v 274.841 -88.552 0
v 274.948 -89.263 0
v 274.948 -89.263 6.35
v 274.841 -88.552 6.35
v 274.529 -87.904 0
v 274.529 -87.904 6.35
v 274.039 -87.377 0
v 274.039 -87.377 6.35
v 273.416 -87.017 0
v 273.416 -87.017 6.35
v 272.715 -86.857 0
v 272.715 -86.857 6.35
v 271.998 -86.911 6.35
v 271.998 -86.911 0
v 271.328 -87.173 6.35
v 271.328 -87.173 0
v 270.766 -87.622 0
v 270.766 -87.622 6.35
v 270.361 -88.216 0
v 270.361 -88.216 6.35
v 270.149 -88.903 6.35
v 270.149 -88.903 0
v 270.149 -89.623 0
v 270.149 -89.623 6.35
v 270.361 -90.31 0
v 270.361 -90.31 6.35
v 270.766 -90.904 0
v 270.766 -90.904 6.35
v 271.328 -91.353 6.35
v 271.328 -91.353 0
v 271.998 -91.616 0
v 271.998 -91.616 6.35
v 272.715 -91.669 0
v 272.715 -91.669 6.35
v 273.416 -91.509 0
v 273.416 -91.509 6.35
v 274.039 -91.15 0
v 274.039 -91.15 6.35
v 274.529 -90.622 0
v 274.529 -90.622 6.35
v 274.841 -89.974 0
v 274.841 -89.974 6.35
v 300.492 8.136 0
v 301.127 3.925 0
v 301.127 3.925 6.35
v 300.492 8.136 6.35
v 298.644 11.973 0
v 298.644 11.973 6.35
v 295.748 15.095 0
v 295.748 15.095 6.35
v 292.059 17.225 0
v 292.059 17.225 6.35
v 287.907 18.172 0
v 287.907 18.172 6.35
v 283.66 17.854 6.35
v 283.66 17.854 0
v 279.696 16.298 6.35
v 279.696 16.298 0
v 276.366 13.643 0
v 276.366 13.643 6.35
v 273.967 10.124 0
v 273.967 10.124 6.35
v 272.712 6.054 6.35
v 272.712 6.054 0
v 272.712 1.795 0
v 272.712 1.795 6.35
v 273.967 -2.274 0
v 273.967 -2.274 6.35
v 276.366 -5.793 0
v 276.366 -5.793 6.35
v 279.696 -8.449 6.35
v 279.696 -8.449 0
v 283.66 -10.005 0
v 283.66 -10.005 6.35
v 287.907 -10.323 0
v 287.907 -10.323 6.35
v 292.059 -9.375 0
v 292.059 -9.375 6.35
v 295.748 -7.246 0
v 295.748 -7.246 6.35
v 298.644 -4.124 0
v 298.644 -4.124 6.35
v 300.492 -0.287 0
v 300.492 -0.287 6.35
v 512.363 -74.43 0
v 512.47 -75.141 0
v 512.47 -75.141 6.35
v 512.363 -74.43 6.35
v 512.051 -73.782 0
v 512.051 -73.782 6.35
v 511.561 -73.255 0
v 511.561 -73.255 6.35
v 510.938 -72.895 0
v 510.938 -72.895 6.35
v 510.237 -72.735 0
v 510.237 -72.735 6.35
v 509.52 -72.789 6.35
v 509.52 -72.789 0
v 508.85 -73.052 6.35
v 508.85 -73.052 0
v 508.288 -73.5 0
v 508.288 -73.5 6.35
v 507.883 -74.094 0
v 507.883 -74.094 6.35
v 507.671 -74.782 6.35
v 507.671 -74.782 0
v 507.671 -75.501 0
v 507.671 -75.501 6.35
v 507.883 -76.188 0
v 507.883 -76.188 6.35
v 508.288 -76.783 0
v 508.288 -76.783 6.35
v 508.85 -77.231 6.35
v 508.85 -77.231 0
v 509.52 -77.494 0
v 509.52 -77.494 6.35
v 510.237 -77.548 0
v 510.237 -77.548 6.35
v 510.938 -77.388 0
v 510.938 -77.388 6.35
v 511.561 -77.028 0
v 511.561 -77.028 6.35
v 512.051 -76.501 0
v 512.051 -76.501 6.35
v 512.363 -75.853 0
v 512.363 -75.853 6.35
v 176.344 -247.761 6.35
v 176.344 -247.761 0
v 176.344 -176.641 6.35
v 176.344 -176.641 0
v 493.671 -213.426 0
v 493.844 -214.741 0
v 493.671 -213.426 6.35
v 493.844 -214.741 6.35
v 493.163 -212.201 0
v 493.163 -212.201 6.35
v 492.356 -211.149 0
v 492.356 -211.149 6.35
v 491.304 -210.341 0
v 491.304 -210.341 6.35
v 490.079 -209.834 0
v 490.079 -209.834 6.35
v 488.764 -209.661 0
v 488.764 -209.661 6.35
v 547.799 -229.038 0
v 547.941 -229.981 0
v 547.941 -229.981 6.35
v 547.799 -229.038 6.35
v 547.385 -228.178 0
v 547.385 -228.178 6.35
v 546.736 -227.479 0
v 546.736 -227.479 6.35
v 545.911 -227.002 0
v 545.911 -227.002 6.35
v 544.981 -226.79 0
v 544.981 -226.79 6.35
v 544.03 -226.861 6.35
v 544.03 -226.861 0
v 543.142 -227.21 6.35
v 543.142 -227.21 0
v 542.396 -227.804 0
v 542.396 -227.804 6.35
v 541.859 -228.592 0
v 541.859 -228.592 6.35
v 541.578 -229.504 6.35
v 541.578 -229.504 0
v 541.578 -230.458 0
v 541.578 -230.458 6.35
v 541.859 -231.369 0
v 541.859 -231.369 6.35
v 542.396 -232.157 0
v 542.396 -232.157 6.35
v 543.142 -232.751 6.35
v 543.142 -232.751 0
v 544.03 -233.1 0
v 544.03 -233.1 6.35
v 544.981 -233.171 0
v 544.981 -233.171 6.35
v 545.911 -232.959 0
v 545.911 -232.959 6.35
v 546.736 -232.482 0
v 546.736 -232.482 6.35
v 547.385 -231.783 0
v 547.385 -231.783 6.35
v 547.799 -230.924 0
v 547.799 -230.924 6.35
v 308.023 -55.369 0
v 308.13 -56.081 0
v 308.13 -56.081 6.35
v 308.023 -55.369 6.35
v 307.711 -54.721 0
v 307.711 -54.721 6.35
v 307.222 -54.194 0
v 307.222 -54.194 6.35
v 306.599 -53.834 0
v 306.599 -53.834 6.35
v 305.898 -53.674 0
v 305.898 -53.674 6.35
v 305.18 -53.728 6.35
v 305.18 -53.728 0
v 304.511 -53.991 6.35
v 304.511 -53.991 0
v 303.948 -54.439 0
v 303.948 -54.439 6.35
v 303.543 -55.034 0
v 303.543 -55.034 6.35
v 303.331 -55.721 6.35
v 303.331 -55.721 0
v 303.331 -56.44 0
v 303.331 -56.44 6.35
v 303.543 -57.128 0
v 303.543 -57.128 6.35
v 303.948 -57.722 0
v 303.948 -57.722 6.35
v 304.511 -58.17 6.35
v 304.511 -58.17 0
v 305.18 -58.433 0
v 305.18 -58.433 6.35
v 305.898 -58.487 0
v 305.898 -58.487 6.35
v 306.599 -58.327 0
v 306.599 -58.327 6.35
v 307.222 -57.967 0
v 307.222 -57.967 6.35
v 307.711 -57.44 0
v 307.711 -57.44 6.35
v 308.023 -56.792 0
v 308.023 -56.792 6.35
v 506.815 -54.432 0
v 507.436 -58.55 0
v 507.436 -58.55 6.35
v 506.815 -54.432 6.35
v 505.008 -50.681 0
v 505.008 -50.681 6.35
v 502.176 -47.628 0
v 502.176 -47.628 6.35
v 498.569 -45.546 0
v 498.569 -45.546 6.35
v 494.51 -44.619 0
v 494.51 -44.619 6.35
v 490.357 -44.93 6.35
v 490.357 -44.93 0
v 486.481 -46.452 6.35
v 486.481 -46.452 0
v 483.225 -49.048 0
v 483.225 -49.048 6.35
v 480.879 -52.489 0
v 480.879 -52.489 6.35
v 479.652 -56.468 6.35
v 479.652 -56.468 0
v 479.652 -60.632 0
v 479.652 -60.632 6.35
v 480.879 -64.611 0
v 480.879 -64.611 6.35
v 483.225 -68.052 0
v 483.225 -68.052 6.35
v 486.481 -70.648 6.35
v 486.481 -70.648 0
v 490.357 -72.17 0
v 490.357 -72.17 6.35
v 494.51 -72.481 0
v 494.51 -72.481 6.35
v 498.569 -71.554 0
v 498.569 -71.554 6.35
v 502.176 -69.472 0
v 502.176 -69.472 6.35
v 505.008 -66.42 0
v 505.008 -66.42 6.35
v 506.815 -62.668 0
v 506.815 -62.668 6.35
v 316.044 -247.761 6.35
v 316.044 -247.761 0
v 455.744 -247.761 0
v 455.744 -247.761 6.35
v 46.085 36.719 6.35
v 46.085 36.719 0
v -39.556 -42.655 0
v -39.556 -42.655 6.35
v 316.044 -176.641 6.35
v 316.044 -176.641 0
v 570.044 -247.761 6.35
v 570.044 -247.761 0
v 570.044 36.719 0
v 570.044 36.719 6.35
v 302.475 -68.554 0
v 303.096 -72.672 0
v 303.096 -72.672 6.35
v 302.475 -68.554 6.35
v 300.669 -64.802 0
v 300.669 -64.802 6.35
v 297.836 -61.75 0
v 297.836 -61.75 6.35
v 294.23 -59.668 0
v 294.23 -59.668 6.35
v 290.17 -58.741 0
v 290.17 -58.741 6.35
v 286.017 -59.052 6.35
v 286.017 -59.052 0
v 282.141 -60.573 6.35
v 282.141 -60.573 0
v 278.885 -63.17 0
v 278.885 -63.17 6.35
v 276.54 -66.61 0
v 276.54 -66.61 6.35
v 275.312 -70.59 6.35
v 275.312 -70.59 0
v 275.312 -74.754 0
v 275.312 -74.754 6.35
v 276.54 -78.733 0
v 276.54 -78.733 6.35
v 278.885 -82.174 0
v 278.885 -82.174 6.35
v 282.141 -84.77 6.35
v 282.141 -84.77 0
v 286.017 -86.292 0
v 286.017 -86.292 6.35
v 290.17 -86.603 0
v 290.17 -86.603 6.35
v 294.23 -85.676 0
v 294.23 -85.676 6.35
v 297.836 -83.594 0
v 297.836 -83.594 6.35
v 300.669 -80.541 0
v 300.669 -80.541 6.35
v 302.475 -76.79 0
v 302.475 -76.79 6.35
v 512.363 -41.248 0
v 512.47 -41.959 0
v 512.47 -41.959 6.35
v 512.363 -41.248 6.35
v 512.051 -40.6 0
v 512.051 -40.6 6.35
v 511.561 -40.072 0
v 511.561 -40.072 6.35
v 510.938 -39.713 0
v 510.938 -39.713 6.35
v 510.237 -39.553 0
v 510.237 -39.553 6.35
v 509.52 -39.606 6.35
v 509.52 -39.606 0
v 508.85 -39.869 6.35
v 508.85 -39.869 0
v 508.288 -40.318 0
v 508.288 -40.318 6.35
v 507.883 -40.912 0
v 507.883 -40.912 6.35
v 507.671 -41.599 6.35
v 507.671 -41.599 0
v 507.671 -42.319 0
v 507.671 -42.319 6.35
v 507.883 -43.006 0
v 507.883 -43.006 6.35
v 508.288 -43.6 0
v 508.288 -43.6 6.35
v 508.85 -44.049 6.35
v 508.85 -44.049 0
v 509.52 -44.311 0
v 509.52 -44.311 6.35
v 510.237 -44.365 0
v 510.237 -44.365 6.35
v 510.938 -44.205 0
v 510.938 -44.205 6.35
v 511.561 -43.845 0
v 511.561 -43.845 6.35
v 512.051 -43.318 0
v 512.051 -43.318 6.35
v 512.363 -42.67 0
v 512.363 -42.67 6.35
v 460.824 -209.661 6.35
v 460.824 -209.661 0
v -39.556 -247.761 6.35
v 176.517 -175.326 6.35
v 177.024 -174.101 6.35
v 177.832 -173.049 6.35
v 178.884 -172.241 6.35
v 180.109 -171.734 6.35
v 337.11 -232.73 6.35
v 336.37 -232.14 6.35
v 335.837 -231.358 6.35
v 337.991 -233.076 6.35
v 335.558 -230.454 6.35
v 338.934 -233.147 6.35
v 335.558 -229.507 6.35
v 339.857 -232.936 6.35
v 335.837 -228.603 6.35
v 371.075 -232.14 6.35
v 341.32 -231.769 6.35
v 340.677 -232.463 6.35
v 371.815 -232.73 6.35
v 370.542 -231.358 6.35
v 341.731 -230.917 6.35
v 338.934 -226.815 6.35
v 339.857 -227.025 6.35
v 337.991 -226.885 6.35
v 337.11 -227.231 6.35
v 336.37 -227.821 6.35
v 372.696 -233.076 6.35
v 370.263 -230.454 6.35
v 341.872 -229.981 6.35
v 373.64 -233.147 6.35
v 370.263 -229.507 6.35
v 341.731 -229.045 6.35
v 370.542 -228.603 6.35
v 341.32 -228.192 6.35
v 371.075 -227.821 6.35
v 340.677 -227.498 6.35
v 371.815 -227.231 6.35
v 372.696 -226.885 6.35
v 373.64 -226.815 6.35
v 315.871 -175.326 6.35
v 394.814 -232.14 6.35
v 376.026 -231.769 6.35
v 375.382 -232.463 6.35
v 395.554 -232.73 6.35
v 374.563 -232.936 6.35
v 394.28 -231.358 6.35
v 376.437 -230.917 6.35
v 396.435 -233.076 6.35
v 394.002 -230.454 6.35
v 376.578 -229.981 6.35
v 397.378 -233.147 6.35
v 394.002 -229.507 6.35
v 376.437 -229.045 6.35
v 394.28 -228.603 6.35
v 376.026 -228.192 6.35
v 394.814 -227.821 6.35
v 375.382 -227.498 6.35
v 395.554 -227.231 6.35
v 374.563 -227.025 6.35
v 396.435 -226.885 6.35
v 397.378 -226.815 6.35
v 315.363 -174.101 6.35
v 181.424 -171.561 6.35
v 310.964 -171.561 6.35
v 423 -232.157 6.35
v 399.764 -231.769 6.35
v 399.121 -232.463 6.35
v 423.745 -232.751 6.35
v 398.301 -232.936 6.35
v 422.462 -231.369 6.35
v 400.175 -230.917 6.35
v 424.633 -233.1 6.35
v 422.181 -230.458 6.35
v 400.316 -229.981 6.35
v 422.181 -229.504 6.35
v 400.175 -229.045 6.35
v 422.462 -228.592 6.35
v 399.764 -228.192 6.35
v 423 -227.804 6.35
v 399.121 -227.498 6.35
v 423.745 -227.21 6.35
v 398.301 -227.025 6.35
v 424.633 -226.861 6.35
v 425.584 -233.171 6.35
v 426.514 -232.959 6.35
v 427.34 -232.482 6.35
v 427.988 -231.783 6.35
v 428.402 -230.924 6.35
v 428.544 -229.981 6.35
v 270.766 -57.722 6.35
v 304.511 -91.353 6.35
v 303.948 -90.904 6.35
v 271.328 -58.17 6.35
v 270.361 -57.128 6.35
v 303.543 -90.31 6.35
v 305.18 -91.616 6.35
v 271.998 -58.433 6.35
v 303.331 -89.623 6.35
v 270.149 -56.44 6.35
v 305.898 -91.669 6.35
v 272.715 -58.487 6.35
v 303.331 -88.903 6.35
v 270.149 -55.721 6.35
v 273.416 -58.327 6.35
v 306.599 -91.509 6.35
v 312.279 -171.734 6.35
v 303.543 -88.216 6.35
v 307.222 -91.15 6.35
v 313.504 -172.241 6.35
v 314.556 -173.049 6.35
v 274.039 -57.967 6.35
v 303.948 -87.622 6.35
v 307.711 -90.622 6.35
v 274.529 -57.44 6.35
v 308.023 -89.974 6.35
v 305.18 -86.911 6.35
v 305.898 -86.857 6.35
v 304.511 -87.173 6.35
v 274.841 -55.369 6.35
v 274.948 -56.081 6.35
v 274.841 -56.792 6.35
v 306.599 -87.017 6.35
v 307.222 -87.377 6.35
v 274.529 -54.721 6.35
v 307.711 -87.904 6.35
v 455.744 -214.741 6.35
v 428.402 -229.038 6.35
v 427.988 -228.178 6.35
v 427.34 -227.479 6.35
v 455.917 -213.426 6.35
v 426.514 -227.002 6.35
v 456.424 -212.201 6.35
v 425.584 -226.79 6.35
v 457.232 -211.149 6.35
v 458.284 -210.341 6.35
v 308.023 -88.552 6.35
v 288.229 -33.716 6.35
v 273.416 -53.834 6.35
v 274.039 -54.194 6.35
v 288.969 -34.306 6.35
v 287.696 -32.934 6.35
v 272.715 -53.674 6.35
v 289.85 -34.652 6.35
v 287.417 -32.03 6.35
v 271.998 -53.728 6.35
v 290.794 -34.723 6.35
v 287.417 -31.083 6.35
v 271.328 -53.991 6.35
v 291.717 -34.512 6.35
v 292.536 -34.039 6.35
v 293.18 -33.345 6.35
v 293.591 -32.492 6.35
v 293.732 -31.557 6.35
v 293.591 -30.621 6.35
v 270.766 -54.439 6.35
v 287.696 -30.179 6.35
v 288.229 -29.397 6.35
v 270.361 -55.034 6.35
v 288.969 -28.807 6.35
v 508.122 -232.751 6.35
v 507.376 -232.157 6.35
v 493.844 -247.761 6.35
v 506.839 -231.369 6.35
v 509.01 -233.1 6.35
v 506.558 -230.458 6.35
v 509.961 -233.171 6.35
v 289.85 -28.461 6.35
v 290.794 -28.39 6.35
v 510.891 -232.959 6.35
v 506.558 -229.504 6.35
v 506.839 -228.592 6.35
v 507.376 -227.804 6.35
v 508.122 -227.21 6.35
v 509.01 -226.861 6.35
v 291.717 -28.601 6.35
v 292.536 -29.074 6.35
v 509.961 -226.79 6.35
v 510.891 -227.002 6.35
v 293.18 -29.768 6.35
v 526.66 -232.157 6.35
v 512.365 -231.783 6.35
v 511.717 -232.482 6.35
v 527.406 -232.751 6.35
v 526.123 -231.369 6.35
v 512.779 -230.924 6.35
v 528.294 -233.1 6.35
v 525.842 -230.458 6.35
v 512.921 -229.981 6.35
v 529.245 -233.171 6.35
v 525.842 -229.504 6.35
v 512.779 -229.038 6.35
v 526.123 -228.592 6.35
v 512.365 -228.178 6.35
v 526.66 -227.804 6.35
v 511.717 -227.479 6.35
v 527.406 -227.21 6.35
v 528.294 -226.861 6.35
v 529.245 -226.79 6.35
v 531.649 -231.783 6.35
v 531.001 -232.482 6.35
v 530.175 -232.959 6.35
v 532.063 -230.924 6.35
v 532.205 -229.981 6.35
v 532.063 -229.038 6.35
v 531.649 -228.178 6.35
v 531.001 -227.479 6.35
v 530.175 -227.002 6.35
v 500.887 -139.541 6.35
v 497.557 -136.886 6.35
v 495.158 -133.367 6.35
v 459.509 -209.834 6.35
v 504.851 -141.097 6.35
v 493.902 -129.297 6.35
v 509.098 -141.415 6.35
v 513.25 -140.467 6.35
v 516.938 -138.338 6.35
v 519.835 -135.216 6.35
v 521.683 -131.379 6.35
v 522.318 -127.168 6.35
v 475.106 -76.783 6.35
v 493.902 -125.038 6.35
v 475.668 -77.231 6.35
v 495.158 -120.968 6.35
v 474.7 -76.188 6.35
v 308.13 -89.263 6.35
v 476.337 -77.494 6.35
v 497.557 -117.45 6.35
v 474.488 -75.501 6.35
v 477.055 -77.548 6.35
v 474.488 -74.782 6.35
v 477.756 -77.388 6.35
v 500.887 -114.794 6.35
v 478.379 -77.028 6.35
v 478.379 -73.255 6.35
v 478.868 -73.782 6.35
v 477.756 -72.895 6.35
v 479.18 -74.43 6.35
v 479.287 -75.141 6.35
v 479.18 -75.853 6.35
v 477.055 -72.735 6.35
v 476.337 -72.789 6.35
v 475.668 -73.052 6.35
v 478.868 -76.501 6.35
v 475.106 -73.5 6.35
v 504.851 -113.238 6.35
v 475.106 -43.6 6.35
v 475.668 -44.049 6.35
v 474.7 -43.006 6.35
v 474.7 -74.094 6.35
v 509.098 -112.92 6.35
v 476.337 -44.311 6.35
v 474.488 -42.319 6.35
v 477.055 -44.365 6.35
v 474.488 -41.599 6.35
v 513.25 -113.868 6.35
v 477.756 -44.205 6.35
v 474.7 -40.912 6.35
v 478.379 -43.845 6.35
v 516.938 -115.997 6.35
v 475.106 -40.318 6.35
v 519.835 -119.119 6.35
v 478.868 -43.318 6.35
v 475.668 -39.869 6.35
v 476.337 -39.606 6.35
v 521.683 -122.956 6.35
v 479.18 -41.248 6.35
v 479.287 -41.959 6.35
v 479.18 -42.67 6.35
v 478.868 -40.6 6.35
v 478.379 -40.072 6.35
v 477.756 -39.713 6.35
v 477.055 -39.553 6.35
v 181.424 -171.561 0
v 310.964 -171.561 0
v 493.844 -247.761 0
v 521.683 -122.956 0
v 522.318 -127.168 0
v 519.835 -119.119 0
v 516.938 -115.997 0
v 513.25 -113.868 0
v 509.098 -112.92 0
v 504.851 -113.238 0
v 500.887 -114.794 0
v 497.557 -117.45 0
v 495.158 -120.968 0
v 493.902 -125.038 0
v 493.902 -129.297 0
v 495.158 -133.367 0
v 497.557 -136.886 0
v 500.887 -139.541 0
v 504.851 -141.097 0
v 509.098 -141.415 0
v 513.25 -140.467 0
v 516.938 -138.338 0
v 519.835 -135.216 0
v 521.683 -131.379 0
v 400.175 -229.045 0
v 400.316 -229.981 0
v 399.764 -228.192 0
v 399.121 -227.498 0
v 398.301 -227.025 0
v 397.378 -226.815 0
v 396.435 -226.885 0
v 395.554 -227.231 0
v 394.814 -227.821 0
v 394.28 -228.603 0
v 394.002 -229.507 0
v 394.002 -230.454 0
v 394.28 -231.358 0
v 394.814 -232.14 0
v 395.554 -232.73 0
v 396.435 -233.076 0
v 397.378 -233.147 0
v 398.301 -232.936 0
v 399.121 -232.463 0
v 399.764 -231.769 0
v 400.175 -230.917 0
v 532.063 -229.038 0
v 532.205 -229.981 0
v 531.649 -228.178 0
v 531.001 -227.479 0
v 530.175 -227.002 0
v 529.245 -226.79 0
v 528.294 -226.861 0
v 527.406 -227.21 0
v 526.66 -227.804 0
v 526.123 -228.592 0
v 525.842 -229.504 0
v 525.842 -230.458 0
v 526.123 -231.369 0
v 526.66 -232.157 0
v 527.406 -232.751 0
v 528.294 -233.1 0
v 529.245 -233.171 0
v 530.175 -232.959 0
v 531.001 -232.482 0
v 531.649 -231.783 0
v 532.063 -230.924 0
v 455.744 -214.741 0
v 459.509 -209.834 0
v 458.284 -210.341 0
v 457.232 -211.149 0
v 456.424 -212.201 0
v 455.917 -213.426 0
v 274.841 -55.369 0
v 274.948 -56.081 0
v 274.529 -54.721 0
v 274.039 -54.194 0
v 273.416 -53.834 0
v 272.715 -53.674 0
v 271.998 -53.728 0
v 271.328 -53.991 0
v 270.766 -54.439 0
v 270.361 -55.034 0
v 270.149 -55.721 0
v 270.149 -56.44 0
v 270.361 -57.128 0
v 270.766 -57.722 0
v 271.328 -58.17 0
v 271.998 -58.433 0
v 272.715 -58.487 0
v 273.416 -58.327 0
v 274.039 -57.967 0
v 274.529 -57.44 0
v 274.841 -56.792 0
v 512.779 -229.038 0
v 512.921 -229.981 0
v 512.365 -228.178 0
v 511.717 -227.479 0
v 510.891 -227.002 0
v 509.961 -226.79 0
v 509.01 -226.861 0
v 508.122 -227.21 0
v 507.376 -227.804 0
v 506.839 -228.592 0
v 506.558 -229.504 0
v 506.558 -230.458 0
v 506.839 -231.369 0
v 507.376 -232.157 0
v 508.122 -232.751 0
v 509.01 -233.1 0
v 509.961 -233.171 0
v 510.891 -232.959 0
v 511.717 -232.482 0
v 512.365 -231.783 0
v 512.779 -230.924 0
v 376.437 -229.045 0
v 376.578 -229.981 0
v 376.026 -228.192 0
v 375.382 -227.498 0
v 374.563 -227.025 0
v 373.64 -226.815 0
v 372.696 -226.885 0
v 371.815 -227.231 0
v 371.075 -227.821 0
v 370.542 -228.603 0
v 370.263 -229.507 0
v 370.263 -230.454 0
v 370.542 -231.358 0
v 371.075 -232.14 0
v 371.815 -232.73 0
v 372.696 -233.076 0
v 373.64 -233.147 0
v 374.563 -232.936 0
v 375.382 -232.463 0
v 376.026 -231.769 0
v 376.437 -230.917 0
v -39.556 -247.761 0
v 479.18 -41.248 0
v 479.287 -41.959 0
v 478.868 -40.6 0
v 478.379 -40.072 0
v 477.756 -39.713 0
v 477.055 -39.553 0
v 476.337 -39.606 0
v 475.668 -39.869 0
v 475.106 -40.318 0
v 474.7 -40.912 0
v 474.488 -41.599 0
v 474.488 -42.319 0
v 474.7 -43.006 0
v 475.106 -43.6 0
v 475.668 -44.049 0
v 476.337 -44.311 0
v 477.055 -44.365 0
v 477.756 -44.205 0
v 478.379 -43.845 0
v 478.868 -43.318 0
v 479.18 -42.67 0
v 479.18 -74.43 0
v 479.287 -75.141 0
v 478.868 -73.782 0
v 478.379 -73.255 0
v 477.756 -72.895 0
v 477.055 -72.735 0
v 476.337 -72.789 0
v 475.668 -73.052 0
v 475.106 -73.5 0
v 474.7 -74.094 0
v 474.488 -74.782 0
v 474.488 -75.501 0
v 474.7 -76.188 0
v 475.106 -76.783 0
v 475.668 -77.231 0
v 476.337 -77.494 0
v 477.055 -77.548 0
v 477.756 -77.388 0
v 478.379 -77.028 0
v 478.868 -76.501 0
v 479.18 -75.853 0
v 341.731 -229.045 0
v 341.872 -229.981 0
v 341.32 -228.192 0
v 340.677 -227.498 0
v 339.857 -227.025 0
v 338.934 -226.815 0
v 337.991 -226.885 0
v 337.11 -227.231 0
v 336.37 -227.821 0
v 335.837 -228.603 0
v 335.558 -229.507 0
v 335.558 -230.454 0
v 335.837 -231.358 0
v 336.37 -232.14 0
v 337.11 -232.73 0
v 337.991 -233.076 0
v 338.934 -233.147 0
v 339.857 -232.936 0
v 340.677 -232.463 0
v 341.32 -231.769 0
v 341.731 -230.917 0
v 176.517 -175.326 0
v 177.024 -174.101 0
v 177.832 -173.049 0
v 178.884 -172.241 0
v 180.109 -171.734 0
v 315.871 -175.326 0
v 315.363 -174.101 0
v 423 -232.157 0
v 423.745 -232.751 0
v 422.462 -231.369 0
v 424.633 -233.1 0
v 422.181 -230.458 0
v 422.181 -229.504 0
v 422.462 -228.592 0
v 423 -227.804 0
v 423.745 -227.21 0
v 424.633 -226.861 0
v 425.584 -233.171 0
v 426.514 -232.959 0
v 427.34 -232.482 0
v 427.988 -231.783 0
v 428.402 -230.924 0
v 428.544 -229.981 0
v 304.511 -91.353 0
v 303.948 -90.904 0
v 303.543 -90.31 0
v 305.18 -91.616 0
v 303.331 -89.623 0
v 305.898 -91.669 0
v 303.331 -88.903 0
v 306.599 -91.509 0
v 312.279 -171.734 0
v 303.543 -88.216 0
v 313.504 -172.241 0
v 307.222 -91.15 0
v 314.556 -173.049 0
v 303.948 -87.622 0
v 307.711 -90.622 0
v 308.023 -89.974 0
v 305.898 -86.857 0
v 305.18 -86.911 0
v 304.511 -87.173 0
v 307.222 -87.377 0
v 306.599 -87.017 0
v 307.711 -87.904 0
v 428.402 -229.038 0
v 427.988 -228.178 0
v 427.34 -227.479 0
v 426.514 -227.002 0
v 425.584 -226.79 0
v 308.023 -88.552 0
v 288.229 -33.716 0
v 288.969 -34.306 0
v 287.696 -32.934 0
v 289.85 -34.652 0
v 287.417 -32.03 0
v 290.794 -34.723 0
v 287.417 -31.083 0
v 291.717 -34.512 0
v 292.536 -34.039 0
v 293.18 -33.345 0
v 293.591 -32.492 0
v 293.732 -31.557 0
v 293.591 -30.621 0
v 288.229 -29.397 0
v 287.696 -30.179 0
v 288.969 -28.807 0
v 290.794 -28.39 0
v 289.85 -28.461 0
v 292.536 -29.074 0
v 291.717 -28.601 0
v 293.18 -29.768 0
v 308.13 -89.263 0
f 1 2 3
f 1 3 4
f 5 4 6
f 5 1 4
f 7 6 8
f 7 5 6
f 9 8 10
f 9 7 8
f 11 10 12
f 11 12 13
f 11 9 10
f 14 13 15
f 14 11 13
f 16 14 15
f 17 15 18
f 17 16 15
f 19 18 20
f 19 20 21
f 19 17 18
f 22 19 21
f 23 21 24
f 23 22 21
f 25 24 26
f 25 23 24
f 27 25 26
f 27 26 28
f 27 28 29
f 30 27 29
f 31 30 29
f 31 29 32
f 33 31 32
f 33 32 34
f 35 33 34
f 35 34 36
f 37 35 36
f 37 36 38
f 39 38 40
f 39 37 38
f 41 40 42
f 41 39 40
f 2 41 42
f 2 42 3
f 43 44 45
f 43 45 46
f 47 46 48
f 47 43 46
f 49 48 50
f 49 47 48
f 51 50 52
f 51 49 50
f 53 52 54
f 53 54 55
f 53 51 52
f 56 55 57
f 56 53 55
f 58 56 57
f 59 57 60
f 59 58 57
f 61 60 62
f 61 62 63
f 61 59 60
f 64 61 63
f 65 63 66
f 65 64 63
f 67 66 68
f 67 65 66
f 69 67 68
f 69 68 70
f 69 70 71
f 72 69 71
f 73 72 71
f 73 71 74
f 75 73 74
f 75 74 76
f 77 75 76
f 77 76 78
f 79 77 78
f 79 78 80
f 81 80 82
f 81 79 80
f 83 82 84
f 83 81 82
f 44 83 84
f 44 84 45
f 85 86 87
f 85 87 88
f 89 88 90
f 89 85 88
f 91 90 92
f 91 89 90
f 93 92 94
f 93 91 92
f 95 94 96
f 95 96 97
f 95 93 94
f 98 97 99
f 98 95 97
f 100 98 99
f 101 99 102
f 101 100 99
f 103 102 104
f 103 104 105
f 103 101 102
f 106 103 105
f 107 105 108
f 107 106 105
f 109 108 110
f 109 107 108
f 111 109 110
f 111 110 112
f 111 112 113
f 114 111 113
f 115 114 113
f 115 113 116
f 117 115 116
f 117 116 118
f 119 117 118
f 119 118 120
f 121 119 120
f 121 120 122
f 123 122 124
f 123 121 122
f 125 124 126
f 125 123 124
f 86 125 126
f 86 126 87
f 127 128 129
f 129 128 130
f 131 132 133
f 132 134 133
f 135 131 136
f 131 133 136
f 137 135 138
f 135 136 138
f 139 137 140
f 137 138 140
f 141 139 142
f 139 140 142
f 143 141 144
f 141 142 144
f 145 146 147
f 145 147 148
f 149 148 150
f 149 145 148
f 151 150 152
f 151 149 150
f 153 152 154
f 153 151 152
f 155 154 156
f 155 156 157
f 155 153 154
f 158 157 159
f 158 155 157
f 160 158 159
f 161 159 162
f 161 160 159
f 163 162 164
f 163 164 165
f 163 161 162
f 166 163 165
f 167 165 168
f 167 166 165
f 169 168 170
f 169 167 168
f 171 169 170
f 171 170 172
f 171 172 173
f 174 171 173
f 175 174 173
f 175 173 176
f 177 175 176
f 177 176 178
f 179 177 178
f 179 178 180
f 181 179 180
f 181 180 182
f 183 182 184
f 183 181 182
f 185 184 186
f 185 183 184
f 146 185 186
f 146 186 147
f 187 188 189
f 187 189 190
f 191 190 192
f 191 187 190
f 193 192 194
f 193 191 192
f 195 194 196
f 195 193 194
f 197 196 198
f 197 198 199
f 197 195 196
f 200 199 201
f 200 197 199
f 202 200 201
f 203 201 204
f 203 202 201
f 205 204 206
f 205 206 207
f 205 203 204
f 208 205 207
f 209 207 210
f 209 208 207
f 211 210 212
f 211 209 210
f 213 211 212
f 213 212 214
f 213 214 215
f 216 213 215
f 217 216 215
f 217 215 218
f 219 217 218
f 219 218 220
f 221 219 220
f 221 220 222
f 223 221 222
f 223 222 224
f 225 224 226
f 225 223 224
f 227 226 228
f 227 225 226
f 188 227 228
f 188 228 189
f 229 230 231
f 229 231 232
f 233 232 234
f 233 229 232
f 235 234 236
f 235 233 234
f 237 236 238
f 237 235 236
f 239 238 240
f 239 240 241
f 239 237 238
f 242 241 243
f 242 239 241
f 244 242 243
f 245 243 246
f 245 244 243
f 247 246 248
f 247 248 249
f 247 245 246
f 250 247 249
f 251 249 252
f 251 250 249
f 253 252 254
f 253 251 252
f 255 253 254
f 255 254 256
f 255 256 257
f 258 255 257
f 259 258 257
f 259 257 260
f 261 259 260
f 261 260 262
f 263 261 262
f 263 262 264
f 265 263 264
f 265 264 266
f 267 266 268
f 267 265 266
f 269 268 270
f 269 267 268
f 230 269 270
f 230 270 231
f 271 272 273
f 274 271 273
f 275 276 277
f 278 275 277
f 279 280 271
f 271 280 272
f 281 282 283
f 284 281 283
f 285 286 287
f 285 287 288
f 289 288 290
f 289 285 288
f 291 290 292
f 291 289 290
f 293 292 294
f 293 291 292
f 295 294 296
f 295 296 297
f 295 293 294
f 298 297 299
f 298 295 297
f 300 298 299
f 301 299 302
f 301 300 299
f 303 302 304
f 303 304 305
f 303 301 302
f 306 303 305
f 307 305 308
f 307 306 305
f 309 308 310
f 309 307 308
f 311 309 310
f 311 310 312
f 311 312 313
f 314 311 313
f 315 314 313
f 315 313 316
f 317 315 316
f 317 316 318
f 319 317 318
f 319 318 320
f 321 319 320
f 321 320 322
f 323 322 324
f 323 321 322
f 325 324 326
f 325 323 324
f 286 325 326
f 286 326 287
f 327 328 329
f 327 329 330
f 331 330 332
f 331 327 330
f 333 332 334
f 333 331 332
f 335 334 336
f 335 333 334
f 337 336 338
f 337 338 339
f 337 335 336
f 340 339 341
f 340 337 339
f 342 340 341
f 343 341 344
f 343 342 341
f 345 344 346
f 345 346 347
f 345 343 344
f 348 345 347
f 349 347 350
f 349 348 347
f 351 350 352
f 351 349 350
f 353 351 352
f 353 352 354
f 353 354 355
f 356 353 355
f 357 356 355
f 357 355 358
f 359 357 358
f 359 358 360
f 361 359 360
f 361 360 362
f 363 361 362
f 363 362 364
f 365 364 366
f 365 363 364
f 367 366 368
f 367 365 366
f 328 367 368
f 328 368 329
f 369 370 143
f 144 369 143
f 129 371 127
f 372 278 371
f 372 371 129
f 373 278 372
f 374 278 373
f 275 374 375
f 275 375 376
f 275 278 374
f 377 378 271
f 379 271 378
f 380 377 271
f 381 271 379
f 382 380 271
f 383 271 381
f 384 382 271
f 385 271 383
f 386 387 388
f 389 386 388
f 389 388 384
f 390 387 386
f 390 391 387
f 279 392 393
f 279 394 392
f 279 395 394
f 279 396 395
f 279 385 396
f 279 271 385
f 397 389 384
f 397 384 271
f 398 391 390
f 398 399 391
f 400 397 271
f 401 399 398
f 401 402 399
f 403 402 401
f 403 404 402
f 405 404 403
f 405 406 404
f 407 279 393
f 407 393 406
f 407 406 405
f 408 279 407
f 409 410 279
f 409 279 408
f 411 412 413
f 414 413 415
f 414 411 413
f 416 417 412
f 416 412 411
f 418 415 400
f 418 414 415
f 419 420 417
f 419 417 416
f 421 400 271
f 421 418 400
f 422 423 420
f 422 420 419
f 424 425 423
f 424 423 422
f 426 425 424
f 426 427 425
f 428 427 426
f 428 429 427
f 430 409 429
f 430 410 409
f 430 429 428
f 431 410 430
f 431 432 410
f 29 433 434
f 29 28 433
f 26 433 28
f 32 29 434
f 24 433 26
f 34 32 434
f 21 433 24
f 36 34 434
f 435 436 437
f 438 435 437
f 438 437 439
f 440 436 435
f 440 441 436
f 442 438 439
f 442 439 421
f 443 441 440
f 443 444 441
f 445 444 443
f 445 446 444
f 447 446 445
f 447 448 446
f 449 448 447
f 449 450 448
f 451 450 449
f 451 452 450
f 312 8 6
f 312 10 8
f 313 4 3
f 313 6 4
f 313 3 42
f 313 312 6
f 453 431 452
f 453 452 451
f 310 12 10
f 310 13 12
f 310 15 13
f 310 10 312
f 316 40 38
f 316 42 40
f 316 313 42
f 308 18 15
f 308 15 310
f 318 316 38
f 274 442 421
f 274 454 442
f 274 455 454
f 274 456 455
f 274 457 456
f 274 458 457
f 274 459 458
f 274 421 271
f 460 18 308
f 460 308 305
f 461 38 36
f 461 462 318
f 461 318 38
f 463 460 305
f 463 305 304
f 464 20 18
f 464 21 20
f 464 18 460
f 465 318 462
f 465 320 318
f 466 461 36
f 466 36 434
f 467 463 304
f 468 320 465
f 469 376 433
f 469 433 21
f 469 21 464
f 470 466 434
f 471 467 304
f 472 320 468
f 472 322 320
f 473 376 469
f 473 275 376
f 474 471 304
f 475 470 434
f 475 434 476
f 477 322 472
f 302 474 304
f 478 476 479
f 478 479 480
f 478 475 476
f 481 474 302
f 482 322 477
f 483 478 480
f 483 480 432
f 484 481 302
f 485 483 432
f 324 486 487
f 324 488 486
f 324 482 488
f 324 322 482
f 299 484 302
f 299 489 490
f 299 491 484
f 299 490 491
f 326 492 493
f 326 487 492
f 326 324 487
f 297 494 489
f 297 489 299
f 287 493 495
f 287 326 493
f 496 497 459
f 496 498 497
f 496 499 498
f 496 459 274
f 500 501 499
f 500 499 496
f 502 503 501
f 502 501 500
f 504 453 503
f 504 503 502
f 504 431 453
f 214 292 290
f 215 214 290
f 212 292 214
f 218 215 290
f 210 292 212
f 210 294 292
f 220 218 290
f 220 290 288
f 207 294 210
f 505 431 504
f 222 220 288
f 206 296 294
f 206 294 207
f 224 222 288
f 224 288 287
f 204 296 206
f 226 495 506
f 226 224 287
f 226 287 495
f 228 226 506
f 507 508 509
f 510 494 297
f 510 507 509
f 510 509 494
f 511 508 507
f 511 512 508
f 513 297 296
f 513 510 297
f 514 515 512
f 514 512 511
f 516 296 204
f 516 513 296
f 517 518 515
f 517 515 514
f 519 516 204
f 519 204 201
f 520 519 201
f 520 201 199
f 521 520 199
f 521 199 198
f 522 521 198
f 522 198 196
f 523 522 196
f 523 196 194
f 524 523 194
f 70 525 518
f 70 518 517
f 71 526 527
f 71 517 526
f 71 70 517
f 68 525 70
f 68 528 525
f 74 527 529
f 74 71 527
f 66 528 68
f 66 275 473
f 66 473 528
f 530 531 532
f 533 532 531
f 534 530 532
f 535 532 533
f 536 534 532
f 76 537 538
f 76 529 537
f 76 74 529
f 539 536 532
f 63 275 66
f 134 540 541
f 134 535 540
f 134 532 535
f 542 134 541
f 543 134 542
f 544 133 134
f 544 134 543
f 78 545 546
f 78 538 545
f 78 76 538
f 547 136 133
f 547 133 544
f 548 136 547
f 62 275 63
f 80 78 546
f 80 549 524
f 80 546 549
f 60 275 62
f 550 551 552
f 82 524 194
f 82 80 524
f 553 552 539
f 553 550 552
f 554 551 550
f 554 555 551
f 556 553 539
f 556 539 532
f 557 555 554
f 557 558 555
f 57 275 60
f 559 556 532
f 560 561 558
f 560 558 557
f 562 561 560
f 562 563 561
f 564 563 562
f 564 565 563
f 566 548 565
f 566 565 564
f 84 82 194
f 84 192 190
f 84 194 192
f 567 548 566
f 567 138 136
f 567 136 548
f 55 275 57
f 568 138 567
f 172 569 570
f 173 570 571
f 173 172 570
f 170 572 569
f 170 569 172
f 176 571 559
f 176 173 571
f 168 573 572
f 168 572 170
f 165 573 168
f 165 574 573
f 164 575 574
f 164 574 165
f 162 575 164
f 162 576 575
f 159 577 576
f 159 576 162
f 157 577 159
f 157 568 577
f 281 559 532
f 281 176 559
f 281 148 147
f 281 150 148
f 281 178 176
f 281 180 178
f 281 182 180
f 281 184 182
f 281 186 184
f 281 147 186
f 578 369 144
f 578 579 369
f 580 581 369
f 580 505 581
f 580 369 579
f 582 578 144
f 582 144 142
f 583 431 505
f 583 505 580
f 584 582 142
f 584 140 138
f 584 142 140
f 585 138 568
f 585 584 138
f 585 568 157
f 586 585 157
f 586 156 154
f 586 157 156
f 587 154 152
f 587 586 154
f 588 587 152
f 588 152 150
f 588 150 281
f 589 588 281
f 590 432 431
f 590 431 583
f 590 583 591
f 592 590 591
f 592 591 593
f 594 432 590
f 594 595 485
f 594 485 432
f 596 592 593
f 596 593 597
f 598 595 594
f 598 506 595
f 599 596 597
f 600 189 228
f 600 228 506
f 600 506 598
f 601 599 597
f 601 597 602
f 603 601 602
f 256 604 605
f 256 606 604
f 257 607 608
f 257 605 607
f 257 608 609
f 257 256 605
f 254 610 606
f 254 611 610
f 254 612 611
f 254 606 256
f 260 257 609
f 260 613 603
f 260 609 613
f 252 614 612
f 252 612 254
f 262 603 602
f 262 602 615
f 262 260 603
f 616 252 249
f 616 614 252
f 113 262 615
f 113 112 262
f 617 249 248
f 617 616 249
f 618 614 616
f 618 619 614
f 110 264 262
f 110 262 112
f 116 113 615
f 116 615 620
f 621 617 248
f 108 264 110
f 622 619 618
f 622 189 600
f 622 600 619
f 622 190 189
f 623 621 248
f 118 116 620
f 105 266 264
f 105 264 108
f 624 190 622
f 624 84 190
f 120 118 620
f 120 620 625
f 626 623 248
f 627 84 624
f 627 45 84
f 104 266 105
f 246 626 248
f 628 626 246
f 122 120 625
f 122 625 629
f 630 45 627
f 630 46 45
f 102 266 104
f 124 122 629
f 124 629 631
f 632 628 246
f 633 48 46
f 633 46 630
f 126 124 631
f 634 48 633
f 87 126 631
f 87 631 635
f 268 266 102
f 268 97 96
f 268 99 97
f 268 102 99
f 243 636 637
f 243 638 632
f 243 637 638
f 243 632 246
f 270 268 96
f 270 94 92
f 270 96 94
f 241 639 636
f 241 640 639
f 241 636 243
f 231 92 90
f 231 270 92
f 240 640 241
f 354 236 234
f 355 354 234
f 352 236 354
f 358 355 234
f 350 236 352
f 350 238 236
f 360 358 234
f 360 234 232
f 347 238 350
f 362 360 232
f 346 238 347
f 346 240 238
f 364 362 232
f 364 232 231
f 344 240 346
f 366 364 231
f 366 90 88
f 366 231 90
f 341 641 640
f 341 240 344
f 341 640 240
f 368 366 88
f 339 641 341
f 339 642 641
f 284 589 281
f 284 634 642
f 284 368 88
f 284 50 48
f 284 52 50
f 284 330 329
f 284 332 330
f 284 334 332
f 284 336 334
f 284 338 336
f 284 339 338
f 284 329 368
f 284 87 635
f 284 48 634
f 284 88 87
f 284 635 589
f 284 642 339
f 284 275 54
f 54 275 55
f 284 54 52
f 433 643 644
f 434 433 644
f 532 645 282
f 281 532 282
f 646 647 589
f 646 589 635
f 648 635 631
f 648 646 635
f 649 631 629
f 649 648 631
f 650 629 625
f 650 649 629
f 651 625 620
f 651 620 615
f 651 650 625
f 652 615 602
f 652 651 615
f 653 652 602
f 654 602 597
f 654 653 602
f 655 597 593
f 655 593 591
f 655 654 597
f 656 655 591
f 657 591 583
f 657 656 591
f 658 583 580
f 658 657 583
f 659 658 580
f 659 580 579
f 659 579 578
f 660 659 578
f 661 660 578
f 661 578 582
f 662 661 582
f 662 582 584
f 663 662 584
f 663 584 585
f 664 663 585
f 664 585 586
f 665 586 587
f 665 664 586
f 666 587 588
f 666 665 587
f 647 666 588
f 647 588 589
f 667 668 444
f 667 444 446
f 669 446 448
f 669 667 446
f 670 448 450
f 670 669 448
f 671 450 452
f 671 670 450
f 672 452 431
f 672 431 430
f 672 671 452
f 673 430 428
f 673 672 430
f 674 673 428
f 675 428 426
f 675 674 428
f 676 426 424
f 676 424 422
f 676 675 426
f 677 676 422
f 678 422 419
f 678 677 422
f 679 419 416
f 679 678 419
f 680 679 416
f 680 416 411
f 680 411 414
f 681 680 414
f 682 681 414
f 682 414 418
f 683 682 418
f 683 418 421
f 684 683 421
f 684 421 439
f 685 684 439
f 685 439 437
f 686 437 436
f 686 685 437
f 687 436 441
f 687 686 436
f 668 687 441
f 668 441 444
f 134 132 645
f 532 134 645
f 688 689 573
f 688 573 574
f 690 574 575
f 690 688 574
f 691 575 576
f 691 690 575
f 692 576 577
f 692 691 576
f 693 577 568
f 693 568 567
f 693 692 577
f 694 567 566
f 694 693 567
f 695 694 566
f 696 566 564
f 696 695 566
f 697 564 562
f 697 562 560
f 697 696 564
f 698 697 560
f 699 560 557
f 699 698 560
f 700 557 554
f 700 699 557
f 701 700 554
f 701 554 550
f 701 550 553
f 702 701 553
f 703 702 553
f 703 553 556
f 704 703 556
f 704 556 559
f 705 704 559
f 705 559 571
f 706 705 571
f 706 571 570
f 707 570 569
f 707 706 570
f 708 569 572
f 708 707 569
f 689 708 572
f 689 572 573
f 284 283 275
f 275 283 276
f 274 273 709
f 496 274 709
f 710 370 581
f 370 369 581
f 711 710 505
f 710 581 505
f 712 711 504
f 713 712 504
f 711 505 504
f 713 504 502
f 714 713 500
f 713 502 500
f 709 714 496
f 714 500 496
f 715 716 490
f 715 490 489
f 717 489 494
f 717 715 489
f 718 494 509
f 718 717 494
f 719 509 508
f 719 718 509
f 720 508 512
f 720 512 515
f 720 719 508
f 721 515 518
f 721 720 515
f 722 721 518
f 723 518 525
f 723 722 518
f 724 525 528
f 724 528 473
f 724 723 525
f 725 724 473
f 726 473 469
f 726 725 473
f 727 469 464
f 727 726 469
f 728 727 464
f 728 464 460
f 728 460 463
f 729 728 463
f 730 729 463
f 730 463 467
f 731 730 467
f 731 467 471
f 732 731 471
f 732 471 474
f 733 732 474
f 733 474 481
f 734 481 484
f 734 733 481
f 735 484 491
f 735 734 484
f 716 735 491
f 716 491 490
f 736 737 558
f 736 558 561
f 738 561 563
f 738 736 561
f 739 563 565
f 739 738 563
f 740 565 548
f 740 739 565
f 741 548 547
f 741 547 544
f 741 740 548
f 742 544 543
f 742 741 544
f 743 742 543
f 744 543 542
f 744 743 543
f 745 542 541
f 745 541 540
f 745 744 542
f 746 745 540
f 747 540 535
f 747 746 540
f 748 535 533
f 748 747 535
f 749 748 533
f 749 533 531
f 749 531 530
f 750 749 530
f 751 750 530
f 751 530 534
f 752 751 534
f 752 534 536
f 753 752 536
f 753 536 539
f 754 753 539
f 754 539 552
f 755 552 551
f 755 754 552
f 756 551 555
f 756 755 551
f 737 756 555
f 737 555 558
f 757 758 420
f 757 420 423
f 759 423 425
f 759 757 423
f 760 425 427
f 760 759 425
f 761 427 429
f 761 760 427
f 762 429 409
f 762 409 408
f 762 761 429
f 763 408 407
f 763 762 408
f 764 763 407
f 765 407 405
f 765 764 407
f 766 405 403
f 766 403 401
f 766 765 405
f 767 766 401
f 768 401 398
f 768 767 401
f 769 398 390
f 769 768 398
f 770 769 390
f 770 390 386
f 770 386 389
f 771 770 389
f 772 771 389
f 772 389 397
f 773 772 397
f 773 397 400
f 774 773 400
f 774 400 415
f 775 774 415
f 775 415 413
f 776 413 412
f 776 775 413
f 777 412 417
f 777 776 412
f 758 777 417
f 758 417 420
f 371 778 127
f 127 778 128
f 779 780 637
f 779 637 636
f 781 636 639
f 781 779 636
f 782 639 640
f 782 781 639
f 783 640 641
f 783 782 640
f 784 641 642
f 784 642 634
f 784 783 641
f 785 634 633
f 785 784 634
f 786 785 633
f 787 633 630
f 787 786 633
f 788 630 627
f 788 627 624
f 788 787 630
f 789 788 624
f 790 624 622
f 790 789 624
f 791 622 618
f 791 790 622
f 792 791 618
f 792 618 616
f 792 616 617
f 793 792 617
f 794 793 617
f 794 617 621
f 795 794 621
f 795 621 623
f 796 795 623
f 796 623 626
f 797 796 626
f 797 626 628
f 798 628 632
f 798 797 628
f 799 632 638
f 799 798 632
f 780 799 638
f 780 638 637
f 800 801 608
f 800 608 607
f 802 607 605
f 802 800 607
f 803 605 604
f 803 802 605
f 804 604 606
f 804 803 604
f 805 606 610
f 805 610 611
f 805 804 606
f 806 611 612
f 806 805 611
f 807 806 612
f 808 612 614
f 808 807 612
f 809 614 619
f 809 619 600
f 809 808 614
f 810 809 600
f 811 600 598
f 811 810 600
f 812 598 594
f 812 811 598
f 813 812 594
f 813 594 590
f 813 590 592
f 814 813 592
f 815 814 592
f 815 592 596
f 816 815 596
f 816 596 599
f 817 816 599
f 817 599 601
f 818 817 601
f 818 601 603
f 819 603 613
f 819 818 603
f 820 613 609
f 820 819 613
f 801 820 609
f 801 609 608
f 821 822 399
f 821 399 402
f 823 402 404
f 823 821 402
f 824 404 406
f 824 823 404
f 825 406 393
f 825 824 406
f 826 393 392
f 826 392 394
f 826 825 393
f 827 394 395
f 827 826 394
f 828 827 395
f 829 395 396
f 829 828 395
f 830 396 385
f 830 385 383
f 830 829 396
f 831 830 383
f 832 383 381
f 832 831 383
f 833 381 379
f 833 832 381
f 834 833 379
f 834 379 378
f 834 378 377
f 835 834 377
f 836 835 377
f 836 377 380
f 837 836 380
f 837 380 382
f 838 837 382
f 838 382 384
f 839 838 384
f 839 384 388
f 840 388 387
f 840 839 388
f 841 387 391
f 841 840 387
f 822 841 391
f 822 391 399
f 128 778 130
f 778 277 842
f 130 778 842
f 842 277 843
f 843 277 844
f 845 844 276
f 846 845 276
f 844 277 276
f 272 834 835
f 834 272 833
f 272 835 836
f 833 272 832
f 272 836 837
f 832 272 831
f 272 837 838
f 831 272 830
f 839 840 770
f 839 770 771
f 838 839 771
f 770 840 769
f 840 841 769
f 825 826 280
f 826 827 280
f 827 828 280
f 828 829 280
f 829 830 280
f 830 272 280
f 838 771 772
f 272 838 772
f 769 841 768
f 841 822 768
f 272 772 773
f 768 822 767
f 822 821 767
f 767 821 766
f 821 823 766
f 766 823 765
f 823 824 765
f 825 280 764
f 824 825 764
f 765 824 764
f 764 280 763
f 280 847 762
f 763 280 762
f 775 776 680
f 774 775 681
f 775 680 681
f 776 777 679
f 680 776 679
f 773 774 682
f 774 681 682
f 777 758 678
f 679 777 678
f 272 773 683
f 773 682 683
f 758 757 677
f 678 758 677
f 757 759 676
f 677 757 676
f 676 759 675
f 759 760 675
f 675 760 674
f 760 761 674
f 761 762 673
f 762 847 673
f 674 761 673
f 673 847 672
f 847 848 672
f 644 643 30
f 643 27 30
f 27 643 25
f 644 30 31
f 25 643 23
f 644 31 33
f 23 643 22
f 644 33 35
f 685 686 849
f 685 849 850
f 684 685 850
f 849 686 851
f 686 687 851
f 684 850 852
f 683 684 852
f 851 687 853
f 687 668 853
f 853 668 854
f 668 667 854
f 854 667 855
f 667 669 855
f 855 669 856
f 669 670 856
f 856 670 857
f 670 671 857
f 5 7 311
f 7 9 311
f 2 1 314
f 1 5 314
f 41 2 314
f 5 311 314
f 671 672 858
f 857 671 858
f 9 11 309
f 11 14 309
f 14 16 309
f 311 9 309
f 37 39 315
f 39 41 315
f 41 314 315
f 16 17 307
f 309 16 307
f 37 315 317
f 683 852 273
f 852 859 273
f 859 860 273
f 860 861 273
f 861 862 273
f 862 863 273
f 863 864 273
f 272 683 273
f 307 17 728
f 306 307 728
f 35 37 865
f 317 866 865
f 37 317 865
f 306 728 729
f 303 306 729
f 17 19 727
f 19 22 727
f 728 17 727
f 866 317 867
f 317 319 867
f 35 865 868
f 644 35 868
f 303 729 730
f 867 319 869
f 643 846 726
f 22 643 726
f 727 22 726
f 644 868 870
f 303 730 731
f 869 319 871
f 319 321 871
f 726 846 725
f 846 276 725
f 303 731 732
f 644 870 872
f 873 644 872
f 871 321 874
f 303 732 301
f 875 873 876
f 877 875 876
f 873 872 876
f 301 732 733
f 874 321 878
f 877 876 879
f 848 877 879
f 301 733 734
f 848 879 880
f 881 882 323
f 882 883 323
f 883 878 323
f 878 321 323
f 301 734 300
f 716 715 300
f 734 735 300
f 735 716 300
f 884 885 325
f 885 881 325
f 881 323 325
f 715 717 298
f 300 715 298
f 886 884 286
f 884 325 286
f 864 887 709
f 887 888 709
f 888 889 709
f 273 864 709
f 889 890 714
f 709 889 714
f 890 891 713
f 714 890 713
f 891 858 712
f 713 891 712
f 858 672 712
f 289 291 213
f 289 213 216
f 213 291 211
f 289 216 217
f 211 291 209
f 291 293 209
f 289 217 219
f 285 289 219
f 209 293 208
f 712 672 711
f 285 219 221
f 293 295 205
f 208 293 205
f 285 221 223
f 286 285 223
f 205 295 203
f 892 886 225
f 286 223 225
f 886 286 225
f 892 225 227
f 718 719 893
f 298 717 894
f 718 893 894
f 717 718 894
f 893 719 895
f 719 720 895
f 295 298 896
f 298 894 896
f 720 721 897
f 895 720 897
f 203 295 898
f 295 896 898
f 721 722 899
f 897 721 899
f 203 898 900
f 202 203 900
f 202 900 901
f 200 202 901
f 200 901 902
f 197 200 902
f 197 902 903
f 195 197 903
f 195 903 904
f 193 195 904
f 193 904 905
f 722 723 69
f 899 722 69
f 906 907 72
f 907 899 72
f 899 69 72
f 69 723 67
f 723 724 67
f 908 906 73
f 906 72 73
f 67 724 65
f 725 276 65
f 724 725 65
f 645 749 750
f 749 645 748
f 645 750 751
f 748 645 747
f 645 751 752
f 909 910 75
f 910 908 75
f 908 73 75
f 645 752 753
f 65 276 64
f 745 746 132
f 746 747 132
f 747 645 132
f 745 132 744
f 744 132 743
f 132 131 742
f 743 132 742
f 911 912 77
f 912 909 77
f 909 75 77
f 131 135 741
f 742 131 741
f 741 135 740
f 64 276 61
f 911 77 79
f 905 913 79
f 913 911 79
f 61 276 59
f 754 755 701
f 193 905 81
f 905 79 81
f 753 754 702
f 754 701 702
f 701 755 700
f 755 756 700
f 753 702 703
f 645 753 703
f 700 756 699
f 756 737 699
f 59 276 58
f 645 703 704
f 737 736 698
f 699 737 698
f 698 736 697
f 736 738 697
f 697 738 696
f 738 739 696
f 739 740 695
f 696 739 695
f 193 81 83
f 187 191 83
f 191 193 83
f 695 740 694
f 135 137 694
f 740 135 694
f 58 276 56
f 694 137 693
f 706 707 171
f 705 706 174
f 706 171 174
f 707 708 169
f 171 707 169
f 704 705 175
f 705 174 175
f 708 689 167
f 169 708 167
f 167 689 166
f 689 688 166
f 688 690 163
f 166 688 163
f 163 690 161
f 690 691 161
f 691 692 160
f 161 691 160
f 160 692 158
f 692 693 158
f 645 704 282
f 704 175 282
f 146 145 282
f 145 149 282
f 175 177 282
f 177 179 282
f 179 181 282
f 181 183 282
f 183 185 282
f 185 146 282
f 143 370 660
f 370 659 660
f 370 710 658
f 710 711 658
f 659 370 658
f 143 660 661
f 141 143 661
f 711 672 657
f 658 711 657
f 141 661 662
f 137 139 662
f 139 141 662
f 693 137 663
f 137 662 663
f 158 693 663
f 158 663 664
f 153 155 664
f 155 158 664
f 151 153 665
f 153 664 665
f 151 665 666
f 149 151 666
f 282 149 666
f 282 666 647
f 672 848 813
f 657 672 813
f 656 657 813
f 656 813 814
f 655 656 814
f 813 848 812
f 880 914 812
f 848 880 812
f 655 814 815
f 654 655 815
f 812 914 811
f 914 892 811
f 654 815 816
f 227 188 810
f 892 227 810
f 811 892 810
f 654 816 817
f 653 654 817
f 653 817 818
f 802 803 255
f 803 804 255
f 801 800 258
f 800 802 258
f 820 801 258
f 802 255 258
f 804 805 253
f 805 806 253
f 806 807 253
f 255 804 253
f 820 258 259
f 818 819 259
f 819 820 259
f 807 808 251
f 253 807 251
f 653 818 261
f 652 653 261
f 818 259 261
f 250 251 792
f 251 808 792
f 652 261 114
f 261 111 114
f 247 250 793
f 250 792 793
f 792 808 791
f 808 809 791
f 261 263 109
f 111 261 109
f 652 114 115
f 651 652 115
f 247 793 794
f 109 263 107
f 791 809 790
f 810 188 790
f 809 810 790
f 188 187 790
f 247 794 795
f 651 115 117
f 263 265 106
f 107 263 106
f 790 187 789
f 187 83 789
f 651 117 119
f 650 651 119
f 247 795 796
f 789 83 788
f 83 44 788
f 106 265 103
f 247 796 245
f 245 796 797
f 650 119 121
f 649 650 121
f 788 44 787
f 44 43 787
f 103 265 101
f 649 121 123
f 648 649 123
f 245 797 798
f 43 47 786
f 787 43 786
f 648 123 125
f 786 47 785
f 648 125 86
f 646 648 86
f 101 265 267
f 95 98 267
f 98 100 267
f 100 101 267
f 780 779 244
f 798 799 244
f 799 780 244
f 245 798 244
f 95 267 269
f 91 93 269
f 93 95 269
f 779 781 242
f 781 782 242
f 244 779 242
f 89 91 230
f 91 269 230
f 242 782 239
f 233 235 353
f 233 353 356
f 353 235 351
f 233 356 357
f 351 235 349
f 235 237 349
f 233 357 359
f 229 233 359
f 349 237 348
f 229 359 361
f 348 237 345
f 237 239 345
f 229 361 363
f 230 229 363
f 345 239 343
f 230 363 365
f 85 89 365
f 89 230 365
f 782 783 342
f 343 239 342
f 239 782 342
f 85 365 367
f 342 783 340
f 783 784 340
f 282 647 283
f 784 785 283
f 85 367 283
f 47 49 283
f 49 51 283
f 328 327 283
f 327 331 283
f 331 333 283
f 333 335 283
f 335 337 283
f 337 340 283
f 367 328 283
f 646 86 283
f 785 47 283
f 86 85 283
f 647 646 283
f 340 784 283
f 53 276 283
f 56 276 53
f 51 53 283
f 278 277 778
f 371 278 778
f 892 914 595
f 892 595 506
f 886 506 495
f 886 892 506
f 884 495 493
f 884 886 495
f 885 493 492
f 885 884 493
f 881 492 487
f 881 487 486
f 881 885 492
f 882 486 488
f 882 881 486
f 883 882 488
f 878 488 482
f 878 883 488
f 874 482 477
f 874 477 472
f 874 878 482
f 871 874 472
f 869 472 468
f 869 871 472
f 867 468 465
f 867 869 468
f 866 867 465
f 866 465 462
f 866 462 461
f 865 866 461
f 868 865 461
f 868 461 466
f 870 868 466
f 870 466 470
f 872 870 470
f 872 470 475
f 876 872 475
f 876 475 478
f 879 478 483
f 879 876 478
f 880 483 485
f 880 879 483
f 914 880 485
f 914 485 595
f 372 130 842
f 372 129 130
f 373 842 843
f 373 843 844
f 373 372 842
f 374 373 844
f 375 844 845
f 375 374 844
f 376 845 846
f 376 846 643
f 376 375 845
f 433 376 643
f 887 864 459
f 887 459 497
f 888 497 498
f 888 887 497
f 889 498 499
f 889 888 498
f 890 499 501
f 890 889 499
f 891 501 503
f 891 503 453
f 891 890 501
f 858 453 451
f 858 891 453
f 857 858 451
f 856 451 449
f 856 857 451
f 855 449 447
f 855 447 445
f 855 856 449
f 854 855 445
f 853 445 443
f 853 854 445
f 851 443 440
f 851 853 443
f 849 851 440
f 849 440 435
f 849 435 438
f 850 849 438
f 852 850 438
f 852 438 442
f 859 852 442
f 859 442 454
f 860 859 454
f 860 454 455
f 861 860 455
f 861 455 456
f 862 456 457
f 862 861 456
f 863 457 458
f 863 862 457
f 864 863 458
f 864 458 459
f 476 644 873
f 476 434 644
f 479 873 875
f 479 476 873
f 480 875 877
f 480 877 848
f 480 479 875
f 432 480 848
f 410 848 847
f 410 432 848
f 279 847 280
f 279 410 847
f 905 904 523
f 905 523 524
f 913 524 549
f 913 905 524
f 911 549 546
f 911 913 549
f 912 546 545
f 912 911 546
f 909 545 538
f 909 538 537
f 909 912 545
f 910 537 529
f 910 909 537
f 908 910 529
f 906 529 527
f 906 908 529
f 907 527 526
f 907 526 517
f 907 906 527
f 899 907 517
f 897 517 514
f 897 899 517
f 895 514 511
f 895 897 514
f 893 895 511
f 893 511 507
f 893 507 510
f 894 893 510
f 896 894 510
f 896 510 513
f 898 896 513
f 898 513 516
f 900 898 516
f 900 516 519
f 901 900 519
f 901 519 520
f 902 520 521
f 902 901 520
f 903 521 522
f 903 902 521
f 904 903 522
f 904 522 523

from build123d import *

# Parameters (mm, degrees)
F0_R     = 3.175
F0_R_2   = 3.1994548284
F0_R_3   = 14.2875
F0_R_4   = 2.413
F0_R_5   = 13.97
F1_DEPTH = 6.35
F2_R     = 5.08


# Not quite as in the source:
# - a length typed as a fraction of an inch, garbled in the dataset ("3 / 203.2 mm" for 3/8 in), is restored


with BuildPart() as f1:
    # F0 (on Top) → F1 (new body)
    with BuildSketch(Plane.XY):
        Polygon((570.0438245296, 36.7193375349), (46.0845124741, 36.7193375349), (-39.5561754704, -42.6550139801), (-39.5561754704, -247.7606624651), (176.3438245296, -247.7606624651), (176.3438245296, -171.5606624651), (316.0438245296, -171.5606624651), (316.0438245296, -247.7606624651), (455.7438245296, -247.7606624651), (455.7438245296, -209.6606624651), (493.8438245296, -209.6606624651), (493.8438245296, -247.7606624651), (570.0438245296, -247.7606624651), align=None)
        with Locations((338.6971652508, -229.9806624651)):
            Circle(F0_R, mode=Mode.SUBTRACT)
        with Locations((373.4027445316, -229.9806624651)):
            Circle(F0_R, mode=Mode.SUBTRACT)
        with Locations((397.1410393715, -229.9806624651)):
            Circle(F0_R, mode=Mode.SUBTRACT)
        with Locations((425.3449738026, -229.9806624651)):
            Circle(F0_R_2, mode=Mode.SUBTRACT)
        with Locations((509.7217559814, -229.9806624651)):
            Circle(F0_R_2, mode=Mode.SUBTRACT)
        with Locations((529.0057063103, -229.9806624651)):
            Circle(F0_R_2, mode=Mode.SUBTRACT)
        with Locations((544.7416305542, -229.9806624651)):
            Circle(F0_R_2, mode=Mode.SUBTRACT)
        with Locations((508.030295372, -127.1675527096)):
            Circle(F0_R_3, mode=Mode.SUBTRACT)
        with Locations((272.5348336594, -89.2630653484)):
            Circle(F0_R_4, mode=Mode.SUBTRACT)
        with Locations((305.7173030479, -89.2630653484)):
            Circle(F0_R_4, mode=Mode.SUBTRACT)
        with Locations((289.1260683537, -72.6718306541)):
            Circle(F0_R_5, mode=Mode.SUBTRACT)
        with Locations((272.5348336594, -56.0805959599)):
            Circle(F0_R_4, mode=Mode.SUBTRACT)
        with Locations((305.7173030479, -56.0805959599)):
            Circle(F0_R_4, mode=Mode.SUBTRACT)
        with Locations((476.8743677037, -75.141350369)):
            Circle(F0_R_4, mode=Mode.SUBTRACT)
        with Locations((510.0568370922, -75.141350369)):
            Circle(F0_R_4, mode=Mode.SUBTRACT)
        with Locations((493.4656023979, -58.5501156747)):
            Circle(F0_R_5, mode=Mode.SUBTRACT)
        with Locations((476.8743677037, -41.9588809805)):
            Circle(F0_R_4, mode=Mode.SUBTRACT)
        with Locations((510.0568370922, -41.9588809805)):
            Circle(F0_R_4, mode=Mode.SUBTRACT)
        with Locations((290.5568880873, -31.5565178133)):
            Circle(F0_R, mode=Mode.SUBTRACT)
        with Locations((286.8396043777, 3.9247339591)):
            Circle(F0_R_3, mode=Mode.SUBTRACT)
    extrude(amount=F1_DEPTH)

    # F2
    f2_edges = [f1.edges().sort_by_distance(p)[0] for p in [
        (176.343825, -171.560662, 3.175),
        (316.043825, -171.560662, 3.175),
        (455.743825, -209.660662, 3.175),
        (493.843825, -209.660662, 3.175),
    ]]
    fillet(f2_edges, radius=F2_R)


solid = f1.part
